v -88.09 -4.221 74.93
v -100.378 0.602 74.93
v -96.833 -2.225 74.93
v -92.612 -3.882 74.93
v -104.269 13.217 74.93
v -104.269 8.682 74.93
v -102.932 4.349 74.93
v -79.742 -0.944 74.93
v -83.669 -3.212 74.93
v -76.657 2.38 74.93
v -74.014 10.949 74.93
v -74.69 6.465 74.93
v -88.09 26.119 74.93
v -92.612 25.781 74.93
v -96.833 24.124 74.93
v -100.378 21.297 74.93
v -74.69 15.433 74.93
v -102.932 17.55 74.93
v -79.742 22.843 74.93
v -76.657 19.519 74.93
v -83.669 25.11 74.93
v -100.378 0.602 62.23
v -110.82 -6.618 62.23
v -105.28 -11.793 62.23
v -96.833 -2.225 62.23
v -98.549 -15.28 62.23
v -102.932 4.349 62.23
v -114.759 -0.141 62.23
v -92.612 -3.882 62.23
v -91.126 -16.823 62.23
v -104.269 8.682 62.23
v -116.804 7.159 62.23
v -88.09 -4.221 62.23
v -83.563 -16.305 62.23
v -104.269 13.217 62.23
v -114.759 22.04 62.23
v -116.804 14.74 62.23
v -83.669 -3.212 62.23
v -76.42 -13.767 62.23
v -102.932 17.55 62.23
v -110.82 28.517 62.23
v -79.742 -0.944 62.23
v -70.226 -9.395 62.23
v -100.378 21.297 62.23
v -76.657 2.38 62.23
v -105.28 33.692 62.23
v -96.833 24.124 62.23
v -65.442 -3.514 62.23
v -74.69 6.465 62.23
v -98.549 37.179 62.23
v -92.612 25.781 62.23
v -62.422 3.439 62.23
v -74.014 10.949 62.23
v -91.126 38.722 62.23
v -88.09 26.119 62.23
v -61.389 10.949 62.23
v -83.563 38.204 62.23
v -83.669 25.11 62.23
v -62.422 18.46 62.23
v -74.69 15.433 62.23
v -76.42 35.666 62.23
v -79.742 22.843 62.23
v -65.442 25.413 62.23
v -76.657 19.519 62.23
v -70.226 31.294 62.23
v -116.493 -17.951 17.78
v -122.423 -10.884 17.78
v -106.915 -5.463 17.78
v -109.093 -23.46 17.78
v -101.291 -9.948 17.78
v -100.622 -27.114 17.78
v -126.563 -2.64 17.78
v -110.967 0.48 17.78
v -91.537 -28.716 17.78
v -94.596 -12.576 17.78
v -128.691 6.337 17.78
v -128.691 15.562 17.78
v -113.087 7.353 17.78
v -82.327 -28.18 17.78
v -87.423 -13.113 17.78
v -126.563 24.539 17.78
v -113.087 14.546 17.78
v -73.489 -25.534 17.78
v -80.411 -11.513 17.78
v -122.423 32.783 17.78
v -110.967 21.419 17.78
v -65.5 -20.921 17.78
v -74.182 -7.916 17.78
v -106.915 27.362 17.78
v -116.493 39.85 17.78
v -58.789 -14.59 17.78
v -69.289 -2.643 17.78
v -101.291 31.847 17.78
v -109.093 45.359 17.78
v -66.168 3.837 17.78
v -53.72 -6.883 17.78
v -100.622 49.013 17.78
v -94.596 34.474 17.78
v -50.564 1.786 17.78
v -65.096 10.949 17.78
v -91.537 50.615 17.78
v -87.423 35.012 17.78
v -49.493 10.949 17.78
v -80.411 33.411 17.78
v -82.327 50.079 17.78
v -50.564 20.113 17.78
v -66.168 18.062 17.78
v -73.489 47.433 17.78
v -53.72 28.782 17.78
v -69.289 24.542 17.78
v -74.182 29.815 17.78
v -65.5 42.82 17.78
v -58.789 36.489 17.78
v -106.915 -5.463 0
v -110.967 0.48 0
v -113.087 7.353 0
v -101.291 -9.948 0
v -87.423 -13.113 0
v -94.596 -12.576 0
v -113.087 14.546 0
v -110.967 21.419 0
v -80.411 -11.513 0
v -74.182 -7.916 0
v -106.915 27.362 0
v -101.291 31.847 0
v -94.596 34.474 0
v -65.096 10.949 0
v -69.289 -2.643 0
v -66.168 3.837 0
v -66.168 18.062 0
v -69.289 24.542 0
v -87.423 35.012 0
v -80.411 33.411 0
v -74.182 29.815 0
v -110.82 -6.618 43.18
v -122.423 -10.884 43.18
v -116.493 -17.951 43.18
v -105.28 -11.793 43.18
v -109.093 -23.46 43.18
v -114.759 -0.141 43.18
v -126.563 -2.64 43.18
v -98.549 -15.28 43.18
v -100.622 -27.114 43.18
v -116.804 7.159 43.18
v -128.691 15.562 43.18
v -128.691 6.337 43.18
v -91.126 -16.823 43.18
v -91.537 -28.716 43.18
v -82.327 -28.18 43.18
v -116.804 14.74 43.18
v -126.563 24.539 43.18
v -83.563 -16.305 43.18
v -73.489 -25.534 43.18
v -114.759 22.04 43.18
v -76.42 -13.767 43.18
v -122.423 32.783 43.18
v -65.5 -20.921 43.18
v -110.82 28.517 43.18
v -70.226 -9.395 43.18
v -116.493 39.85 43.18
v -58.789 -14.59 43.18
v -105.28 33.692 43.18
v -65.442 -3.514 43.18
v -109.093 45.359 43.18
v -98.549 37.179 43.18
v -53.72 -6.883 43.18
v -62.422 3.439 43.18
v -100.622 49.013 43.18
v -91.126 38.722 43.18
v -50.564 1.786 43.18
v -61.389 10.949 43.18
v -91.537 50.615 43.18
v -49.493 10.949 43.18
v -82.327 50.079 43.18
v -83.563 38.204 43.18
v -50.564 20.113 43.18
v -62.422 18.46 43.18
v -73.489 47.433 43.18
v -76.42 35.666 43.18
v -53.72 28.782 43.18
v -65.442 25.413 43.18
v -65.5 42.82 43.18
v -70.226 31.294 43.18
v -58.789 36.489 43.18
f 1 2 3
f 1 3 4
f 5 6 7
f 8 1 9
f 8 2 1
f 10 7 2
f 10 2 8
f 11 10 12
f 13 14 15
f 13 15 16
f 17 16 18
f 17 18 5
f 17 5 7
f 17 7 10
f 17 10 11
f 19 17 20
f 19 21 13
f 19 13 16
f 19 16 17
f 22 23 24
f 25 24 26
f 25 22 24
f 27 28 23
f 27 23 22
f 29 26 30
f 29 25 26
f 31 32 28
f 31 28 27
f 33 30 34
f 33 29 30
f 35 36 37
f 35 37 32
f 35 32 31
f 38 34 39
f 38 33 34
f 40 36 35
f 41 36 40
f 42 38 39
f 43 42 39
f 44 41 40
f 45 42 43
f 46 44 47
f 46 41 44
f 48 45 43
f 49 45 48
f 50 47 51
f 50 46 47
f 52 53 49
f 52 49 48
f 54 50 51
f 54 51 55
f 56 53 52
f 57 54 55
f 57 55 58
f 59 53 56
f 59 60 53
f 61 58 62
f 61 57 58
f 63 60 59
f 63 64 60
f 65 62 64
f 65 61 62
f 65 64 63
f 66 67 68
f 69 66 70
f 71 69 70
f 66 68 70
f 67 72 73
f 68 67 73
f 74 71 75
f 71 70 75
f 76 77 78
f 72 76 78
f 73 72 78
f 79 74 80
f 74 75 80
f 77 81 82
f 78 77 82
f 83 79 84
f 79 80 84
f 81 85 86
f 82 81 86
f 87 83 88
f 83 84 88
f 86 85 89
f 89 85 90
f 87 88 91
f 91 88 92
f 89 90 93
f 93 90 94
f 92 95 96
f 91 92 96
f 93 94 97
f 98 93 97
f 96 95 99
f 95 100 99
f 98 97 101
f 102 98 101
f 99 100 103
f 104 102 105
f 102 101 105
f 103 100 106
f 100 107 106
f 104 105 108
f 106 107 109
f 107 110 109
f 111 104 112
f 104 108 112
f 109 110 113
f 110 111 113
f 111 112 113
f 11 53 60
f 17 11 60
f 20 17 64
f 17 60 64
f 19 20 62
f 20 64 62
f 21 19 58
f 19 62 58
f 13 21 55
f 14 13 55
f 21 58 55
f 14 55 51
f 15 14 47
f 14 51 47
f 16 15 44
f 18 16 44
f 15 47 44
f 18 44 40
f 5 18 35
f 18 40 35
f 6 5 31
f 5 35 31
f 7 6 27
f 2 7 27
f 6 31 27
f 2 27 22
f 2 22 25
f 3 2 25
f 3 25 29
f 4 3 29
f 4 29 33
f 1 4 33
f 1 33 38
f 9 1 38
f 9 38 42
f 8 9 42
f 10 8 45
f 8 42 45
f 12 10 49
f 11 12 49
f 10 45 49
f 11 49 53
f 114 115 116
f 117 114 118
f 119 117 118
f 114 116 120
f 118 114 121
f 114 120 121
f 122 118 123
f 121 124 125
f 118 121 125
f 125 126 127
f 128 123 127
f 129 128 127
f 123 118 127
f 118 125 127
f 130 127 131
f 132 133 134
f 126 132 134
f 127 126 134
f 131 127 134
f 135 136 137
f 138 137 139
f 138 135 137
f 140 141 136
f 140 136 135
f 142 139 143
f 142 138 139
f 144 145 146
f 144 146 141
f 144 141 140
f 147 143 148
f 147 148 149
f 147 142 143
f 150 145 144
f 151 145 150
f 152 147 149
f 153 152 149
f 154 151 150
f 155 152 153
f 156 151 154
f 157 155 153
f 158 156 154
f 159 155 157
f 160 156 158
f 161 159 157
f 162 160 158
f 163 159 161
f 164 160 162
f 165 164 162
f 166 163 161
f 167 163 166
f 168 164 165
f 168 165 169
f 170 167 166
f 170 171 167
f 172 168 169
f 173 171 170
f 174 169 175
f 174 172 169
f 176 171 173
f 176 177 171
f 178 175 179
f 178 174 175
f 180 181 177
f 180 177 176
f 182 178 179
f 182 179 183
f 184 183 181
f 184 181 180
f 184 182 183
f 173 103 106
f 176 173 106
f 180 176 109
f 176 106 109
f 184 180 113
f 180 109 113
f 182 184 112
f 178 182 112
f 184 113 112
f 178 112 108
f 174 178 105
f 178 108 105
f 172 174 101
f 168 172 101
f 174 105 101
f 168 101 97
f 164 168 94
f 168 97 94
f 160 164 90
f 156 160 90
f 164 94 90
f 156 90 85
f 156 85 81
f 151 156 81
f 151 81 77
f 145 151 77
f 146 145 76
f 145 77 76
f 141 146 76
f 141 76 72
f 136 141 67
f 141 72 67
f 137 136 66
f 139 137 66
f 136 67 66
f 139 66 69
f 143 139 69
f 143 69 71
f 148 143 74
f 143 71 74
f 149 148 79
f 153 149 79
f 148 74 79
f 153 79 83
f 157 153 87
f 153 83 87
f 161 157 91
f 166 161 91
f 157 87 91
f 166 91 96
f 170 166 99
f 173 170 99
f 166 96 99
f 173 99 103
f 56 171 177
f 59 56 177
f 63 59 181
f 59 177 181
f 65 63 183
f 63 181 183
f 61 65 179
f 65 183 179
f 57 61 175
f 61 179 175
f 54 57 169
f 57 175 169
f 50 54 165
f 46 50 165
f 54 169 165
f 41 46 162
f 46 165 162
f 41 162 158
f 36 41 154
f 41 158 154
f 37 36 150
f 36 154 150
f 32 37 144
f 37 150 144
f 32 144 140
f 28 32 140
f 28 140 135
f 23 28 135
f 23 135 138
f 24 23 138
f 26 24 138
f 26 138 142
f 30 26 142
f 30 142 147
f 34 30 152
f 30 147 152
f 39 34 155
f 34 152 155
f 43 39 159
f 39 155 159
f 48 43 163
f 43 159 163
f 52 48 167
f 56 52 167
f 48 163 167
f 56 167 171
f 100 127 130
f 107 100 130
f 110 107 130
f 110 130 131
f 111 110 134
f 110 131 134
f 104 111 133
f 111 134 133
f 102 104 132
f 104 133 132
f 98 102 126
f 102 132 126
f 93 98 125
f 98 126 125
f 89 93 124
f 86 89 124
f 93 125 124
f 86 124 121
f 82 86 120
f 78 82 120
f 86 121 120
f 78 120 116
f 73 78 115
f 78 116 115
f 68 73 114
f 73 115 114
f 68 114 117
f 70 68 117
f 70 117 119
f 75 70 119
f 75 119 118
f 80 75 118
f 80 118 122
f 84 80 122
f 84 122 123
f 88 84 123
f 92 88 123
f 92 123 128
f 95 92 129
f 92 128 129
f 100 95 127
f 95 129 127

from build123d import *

# Parameters (mm, degrees)
F0_R     = 24.13
F1_DEPTH = 17.78
F2_R     = 39.733027
F2_R_2   = 24.13
F3_DEPTH = 25.4
F4_R     = 27.837104
F5_DEPTH = 19.05
F6_R     = 15.212569
F7_DEPTH = 12.7


with BuildPart() as f1:
    # F0 (on Top) → F1 (new body)
    with BuildSketch(Plane.XY):
        with Locations((-89.226432, 10.949461)):
            Circle(F0_R)
    extrude(amount=F1_DEPTH)

    # F2 (on face) → F3 (join)
    with BuildSketch(Plane.XY.offset(17.78)):
        with Locations((-89.226432, 10.949461)):
            Circle(F2_R)
        with Locations((-89.226432, 10.949461)):
            Circle(F2_R_2, mode=Mode.SUBTRACT)
        with Locations((-89.226432, 10.949461)):
            Circle(F2_R_2)
    extrude(amount=F3_DEPTH)

    # F4 (on face) → F5 (join)
    with BuildSketch(Plane.XY.offset(43.18)):
        with Locations((-89.226432, 10.949461)):
            Circle(F4_R)
    extrude(amount=F5_DEPTH)

    # F6 (on face) → F7 (join)
    with BuildSketch(Plane.XY.offset(62.23)):
        with Locations((-89.226432, 10.949461)):
            Circle(F6_R)
    extrude(amount=F7_DEPTH)


solid = f1.part
